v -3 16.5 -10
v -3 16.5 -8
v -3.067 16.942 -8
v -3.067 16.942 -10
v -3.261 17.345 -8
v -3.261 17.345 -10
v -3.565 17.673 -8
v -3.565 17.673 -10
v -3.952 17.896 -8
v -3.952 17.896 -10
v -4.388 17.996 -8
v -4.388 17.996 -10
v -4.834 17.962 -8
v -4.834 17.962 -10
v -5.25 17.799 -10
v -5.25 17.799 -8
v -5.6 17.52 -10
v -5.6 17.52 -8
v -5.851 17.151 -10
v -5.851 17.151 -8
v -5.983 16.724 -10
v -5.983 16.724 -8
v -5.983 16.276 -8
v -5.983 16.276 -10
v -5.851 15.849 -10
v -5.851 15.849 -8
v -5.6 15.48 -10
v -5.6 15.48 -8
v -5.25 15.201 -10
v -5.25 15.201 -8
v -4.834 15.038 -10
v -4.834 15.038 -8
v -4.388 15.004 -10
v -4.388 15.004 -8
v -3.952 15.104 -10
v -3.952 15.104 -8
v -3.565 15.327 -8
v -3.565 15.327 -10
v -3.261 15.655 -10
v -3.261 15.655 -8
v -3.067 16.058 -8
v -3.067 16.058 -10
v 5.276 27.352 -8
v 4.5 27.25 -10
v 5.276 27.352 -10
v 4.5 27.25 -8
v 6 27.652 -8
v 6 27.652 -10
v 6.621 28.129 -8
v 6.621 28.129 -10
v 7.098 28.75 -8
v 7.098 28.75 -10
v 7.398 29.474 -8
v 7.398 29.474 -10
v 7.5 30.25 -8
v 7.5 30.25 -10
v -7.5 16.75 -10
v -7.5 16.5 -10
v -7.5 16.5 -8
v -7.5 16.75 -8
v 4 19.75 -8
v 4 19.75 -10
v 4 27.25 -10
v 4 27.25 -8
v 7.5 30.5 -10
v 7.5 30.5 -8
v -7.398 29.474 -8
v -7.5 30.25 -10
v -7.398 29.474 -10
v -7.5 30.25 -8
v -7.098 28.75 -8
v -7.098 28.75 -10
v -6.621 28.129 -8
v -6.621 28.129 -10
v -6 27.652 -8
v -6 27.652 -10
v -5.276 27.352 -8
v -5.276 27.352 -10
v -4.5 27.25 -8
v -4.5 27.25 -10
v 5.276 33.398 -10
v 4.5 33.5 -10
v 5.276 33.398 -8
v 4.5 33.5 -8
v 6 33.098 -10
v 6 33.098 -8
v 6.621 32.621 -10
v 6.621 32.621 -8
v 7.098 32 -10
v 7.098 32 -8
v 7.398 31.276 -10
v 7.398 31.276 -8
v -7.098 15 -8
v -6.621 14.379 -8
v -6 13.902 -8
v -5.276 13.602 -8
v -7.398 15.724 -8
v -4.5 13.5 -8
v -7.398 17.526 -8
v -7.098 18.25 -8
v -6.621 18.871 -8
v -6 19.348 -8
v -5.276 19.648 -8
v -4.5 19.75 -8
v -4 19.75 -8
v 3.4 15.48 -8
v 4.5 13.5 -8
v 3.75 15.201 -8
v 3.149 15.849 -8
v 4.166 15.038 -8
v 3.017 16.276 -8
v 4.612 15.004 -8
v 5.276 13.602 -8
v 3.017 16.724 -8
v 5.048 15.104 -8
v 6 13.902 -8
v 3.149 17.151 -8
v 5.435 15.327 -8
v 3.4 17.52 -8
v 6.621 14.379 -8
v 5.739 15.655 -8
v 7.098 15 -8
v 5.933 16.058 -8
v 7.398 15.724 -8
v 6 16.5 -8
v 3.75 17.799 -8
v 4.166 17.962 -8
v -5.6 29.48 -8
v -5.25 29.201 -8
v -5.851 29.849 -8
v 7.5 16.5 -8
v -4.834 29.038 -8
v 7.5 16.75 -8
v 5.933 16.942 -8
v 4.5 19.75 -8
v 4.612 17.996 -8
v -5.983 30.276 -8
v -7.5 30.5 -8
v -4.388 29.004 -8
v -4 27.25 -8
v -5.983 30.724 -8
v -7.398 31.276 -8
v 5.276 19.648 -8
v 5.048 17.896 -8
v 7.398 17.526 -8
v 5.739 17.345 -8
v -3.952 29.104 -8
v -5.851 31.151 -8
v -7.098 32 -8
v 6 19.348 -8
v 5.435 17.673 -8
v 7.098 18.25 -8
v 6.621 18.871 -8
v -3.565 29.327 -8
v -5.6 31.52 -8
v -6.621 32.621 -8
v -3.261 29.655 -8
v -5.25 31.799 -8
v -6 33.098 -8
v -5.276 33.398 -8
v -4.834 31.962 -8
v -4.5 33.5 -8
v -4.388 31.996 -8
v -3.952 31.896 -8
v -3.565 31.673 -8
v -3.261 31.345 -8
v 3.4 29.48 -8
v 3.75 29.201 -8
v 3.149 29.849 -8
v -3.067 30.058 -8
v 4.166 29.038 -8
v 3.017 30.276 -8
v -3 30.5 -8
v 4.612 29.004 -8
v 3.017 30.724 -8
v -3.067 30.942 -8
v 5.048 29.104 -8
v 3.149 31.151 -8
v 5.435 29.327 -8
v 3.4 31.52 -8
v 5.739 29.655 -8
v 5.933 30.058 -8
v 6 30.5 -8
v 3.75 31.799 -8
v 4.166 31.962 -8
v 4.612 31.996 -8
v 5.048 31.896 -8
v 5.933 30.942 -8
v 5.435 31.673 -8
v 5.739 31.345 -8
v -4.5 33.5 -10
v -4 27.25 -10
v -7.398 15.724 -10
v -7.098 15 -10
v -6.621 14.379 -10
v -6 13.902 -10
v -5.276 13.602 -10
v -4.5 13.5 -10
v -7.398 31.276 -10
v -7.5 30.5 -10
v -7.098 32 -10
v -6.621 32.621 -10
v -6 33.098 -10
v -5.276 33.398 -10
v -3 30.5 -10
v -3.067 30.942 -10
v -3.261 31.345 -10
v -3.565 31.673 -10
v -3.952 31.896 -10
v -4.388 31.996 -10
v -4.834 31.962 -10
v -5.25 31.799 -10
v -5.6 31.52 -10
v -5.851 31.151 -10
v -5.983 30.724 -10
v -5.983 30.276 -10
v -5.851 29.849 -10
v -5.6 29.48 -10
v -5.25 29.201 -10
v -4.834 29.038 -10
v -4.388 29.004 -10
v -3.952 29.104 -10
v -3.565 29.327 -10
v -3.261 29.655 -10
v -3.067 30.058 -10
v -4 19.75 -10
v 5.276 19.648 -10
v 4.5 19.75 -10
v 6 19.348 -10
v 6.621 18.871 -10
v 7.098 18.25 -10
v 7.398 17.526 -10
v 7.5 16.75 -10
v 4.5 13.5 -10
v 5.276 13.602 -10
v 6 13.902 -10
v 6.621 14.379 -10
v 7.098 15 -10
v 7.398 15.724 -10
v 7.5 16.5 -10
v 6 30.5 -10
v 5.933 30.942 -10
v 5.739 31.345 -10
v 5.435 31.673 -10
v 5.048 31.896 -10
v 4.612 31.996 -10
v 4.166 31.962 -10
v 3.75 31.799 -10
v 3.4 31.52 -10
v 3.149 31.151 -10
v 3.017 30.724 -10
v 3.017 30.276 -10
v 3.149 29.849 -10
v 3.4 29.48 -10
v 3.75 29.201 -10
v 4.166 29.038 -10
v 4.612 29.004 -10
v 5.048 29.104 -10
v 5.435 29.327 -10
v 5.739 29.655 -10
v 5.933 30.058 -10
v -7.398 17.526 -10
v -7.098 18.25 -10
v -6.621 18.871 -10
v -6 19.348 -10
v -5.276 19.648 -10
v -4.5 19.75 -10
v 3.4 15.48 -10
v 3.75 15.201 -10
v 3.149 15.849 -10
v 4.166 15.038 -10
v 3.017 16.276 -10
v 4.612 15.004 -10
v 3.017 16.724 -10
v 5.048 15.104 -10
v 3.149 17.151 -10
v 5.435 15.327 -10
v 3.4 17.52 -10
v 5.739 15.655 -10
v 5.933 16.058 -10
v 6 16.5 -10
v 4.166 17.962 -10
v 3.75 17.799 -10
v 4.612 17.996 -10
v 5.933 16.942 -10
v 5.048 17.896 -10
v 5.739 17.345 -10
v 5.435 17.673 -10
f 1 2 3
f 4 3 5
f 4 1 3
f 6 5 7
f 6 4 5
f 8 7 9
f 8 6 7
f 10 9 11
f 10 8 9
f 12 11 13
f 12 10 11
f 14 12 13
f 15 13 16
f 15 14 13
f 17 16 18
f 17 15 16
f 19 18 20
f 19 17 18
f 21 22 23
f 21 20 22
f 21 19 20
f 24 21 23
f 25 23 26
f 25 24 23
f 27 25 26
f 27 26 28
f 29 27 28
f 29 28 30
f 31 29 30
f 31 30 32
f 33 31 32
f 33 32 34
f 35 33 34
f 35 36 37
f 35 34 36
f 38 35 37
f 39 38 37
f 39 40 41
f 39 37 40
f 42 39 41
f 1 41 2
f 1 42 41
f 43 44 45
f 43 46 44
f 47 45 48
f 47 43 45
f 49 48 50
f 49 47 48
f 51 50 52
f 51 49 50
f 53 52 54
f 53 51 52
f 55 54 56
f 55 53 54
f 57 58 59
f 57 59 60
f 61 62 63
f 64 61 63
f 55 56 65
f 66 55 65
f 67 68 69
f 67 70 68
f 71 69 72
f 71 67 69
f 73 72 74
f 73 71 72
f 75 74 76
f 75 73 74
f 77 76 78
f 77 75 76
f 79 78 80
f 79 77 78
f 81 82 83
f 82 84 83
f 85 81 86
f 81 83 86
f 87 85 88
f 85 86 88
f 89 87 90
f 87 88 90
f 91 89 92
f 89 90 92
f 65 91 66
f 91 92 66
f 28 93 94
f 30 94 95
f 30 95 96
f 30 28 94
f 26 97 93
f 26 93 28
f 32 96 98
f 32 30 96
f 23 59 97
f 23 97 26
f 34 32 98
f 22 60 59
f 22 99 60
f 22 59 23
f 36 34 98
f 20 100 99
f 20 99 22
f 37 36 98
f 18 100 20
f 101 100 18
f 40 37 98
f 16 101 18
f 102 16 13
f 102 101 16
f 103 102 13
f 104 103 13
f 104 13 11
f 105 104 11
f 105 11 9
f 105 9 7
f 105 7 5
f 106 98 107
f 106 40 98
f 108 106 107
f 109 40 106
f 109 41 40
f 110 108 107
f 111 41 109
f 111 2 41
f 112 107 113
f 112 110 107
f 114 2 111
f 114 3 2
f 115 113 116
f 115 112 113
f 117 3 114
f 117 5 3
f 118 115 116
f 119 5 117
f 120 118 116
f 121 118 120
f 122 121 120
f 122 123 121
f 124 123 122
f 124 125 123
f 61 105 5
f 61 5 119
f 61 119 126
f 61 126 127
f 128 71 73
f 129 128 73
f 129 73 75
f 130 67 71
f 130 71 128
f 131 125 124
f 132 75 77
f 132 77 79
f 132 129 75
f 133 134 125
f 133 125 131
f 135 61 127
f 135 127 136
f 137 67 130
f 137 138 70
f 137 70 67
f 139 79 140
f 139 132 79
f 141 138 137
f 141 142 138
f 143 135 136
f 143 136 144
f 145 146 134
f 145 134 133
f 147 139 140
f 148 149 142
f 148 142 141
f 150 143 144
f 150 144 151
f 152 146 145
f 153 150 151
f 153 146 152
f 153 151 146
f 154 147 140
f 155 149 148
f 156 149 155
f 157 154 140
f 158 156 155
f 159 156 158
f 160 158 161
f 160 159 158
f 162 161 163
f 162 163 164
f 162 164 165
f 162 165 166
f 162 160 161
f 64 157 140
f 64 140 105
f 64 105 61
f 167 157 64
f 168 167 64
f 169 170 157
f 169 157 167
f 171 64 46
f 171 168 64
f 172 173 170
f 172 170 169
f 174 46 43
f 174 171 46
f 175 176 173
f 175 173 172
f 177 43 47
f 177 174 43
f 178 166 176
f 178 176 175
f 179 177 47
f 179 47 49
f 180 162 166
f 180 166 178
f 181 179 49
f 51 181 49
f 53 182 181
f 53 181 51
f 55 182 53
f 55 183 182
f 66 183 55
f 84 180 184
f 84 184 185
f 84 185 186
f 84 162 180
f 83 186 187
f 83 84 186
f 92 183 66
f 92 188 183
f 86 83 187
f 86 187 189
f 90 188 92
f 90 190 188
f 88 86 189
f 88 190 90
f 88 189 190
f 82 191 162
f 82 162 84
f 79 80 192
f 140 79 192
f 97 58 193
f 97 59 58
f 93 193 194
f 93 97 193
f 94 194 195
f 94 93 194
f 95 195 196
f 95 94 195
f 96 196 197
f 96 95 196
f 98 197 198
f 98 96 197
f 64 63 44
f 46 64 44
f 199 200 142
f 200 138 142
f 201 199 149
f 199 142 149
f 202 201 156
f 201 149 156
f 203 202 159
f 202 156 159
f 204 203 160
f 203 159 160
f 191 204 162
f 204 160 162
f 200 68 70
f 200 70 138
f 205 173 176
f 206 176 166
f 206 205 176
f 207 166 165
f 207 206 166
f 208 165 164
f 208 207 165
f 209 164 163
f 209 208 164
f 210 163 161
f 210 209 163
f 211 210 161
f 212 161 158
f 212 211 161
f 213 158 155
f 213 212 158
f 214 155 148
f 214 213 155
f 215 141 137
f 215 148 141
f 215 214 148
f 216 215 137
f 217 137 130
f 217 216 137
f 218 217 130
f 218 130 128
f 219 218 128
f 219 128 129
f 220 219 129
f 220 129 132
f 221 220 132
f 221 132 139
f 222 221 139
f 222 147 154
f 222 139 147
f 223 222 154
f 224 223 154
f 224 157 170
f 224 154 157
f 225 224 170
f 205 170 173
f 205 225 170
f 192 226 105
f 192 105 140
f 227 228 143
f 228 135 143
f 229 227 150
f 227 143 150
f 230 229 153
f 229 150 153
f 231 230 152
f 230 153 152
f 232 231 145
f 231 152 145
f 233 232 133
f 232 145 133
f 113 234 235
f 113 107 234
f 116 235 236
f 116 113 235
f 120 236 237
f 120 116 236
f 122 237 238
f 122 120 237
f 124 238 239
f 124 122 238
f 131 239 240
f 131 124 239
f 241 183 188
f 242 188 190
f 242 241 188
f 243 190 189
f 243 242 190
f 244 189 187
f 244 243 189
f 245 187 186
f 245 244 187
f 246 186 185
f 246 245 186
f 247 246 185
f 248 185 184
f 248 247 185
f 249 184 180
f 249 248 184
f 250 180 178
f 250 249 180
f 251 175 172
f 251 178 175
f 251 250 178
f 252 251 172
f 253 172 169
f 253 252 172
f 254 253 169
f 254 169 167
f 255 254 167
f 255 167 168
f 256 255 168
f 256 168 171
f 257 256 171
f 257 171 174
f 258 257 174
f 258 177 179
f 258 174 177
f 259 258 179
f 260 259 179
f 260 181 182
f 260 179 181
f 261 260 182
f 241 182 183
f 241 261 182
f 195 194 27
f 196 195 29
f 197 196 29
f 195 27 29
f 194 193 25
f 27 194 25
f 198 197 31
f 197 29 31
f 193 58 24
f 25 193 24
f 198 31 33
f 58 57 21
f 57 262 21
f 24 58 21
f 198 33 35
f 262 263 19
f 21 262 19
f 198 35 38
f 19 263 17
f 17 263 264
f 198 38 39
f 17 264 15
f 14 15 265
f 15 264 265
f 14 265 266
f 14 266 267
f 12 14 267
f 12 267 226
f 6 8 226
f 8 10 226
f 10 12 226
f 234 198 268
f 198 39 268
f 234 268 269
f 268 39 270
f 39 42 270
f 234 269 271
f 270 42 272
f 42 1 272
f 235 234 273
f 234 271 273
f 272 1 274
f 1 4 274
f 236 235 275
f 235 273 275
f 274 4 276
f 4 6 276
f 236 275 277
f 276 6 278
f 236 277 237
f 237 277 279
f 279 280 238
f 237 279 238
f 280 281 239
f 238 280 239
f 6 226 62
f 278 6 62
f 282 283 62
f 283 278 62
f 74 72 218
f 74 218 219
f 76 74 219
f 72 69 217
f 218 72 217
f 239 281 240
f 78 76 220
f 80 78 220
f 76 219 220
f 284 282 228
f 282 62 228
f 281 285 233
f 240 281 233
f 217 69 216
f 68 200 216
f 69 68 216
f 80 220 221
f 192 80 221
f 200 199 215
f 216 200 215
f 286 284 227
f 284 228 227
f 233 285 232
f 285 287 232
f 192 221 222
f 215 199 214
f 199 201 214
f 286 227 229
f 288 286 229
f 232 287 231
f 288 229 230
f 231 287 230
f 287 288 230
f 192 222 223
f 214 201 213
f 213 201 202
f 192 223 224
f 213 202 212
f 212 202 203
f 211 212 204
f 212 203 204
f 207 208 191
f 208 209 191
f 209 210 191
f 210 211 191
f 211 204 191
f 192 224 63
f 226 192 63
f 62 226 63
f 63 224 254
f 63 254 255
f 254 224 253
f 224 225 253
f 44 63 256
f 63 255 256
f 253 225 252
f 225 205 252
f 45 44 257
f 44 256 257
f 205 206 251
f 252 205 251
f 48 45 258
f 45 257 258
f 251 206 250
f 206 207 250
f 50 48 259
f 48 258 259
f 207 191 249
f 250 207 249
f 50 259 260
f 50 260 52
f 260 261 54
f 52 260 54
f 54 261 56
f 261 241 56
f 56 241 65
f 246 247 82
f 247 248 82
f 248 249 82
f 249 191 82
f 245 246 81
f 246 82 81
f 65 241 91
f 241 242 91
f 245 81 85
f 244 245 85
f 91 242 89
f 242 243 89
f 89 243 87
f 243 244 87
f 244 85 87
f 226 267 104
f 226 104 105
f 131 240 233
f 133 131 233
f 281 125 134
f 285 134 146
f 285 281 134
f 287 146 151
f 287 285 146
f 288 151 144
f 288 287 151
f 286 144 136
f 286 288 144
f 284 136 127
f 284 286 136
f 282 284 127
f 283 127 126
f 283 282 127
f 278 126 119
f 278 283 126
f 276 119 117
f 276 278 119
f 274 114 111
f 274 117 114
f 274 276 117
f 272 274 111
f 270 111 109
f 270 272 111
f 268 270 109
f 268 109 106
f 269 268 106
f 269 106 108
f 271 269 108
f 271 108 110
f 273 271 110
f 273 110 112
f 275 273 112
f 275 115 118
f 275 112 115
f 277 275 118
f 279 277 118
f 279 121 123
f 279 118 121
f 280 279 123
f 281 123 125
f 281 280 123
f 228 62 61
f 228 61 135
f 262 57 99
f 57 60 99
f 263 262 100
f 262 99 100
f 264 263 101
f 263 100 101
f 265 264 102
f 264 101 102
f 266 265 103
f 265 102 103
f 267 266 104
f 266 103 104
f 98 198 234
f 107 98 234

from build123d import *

# Parameters (mm, degrees)
CYLINDER713_R     = 1.5
CYLINDER713_DEPTH = 14
CYLINDER710_R     = 1.5
CYLINDER710_DEPTH = 14
CYLINDER711_R     = 1.5
CYLINDER711_DEPTH = 14
CYLINDER712_R     = 1.5
CYLINDER712_DEPTH = 14
BOX045_W          = 15
BOX045_H          = 7.5
BOX045_DEPTH      = 2
BOX044_W          = 15
BOX044_H          = 20
BOX044_DEPTH      = 2
FILLET001008_R    = 3
BOX046_W          = 8
BOX046_H          = 9
BOX046_DEPTH      = 2


with BuildPart() as cylinder783:
    # Cylinder713 → Cylinder713 (new body)
    with BuildSketch(Plane(origin=(-4.5, -50.5, -7), x_dir=(1, 0, 0), z_dir=(0, 0, 1))):
        Circle(CYLINDER713_R)
    extrude(amount=CYLINDER713_DEPTH)


with BuildPart() as fusion001005002004004005002010_body:
    # Cylinder710 → Cylinder710 (new body)
    with BuildSketch(Plane(origin=(4.5, -50.5, -7), x_dir=(1, 0, 0), z_dir=(0, 0, 1))):
        Circle(CYLINDER710_R)
    extrude(amount=CYLINDER710_DEPTH)

    # Fusion001005002004004005002010002003003003017007024017: union Cylinder783
    add(cylinder783.part)


with BuildPart() as fusion001005002004004005002010_body_1:
    # Fusion001005002004004005002010002003003003017007024017 placement: moved
    add(fusion001005002004004005002010_body.part.moved(Location((0, 4, -3))))


with BuildPart() as cylinder781:
    # Cylinder711 → Cylinder711 (new body)
    with BuildSketch(Plane(origin=(-4.5, -50.5, -7), x_dir=(1, 0, 0), z_dir=(0, 0, 1))):
        Circle(CYLINDER711_R)
    extrude(amount=CYLINDER711_DEPTH)


with BuildPart() as fusion001005002004004005002010_body2:
    # Cylinder712 → Cylinder712 (new body)
    with BuildSketch(Plane(origin=(4.5, -50.5, -7), x_dir=(1, 0, 0), z_dir=(0, 0, 1))):
        Circle(CYLINDER712_R)
    extrude(amount=CYLINDER712_DEPTH)

    # Fusion001005002004004005002010002003003003017007024018: union Cylinder781
    add(cylinder781.part)


with BuildPart() as fusion001005002004004005002010_body2_1:
    # Fusion001005002004004005002010002003003003017007024018 placement: moved
    add(fusion001005002004004005002010_body2.part.moved(Location((0, 18, -3))))

    # Fusion001005002004004005002010002003003003017007024019: union Fusion001005002004004005002010 body
    add(fusion001005002004004005002010_body_1.part)


with BuildPart() as cube045:
    # Box045 → Box045 (new body)
    with BuildSketch(Plane(origin=(-7.5, -43.25, -11), x_dir=(1, 0, 0), z_dir=(0, 0, 1))):
        with Locations((7.5, 3.75)):
            Rectangle(BOX045_W, BOX045_H)
    extrude(amount=BOX045_DEPTH)


with BuildPart() as fillet001008:
    # Box044 → Box044 (new body)
    with BuildSketch(Plane(origin=(-7.5, -49.5, -11), x_dir=(1, 0, 0), z_dir=(0, 0, 1))):
        with Locations((7.5, 10)):
            Rectangle(BOX044_W, BOX044_H)
    extrude(amount=BOX044_DEPTH)

    # Cut012030: cut Cube045
    add(cube045.part, mode=Mode.SUBTRACT)

    # Fillet001008
    fillet001008_edges = [fillet001008.edges().sort_by_distance(p)[0] for p in [
        (-7.5, -43.25, -10),
        (-7.5, -49.5, -10),
        (7.5, -43.25, -10),
        (7.5, -49.5, -10),
        (-7.5, -29.5, -10),
        (-7.5, -35.75, -10),
        (7.5, -29.5, -10),
        (7.5, -35.75, -10),
    ]]
    fillet(fillet001008_edges, radius=FILLET001008_R)


with BuildPart() as axle_leafspring_lock_right:
    # Box046 → Box046 (new body)
    with BuildSketch(Plane(origin=(-4, -44, -11), x_dir=(1, 0, 0), z_dir=(0, 0, 1))):
        with Locations((4, 4.5)):
            Rectangle(BOX046_W, BOX046_H)
    extrude(amount=BOX046_DEPTH)

    # Fusion001005002004004005002010002003003003017007024016: union Fillet001008
    add(fillet001008.part)


with BuildPart() as axle_leafspring_lock_right_1:
    # Fusion001005002004004005002010002003003003017007024016 placement: moved
    add(axle_leafspring_lock_right.part.moved(Location((0, 0, 1))))

    # Cut012031: cut Fusion001005002004004005002010 body2
    add(fusion001005002004004005002010_body2_1.part, mode=Mode.SUBTRACT)


with BuildPart() as axle_leafspring_lock_right_2:
    # Cut012031 placement: moved
    add(axle_leafspring_lock_right_1.part.moved(Location((0, 63, 0))))


solid = axle_leafspring_lock_right_2.part
